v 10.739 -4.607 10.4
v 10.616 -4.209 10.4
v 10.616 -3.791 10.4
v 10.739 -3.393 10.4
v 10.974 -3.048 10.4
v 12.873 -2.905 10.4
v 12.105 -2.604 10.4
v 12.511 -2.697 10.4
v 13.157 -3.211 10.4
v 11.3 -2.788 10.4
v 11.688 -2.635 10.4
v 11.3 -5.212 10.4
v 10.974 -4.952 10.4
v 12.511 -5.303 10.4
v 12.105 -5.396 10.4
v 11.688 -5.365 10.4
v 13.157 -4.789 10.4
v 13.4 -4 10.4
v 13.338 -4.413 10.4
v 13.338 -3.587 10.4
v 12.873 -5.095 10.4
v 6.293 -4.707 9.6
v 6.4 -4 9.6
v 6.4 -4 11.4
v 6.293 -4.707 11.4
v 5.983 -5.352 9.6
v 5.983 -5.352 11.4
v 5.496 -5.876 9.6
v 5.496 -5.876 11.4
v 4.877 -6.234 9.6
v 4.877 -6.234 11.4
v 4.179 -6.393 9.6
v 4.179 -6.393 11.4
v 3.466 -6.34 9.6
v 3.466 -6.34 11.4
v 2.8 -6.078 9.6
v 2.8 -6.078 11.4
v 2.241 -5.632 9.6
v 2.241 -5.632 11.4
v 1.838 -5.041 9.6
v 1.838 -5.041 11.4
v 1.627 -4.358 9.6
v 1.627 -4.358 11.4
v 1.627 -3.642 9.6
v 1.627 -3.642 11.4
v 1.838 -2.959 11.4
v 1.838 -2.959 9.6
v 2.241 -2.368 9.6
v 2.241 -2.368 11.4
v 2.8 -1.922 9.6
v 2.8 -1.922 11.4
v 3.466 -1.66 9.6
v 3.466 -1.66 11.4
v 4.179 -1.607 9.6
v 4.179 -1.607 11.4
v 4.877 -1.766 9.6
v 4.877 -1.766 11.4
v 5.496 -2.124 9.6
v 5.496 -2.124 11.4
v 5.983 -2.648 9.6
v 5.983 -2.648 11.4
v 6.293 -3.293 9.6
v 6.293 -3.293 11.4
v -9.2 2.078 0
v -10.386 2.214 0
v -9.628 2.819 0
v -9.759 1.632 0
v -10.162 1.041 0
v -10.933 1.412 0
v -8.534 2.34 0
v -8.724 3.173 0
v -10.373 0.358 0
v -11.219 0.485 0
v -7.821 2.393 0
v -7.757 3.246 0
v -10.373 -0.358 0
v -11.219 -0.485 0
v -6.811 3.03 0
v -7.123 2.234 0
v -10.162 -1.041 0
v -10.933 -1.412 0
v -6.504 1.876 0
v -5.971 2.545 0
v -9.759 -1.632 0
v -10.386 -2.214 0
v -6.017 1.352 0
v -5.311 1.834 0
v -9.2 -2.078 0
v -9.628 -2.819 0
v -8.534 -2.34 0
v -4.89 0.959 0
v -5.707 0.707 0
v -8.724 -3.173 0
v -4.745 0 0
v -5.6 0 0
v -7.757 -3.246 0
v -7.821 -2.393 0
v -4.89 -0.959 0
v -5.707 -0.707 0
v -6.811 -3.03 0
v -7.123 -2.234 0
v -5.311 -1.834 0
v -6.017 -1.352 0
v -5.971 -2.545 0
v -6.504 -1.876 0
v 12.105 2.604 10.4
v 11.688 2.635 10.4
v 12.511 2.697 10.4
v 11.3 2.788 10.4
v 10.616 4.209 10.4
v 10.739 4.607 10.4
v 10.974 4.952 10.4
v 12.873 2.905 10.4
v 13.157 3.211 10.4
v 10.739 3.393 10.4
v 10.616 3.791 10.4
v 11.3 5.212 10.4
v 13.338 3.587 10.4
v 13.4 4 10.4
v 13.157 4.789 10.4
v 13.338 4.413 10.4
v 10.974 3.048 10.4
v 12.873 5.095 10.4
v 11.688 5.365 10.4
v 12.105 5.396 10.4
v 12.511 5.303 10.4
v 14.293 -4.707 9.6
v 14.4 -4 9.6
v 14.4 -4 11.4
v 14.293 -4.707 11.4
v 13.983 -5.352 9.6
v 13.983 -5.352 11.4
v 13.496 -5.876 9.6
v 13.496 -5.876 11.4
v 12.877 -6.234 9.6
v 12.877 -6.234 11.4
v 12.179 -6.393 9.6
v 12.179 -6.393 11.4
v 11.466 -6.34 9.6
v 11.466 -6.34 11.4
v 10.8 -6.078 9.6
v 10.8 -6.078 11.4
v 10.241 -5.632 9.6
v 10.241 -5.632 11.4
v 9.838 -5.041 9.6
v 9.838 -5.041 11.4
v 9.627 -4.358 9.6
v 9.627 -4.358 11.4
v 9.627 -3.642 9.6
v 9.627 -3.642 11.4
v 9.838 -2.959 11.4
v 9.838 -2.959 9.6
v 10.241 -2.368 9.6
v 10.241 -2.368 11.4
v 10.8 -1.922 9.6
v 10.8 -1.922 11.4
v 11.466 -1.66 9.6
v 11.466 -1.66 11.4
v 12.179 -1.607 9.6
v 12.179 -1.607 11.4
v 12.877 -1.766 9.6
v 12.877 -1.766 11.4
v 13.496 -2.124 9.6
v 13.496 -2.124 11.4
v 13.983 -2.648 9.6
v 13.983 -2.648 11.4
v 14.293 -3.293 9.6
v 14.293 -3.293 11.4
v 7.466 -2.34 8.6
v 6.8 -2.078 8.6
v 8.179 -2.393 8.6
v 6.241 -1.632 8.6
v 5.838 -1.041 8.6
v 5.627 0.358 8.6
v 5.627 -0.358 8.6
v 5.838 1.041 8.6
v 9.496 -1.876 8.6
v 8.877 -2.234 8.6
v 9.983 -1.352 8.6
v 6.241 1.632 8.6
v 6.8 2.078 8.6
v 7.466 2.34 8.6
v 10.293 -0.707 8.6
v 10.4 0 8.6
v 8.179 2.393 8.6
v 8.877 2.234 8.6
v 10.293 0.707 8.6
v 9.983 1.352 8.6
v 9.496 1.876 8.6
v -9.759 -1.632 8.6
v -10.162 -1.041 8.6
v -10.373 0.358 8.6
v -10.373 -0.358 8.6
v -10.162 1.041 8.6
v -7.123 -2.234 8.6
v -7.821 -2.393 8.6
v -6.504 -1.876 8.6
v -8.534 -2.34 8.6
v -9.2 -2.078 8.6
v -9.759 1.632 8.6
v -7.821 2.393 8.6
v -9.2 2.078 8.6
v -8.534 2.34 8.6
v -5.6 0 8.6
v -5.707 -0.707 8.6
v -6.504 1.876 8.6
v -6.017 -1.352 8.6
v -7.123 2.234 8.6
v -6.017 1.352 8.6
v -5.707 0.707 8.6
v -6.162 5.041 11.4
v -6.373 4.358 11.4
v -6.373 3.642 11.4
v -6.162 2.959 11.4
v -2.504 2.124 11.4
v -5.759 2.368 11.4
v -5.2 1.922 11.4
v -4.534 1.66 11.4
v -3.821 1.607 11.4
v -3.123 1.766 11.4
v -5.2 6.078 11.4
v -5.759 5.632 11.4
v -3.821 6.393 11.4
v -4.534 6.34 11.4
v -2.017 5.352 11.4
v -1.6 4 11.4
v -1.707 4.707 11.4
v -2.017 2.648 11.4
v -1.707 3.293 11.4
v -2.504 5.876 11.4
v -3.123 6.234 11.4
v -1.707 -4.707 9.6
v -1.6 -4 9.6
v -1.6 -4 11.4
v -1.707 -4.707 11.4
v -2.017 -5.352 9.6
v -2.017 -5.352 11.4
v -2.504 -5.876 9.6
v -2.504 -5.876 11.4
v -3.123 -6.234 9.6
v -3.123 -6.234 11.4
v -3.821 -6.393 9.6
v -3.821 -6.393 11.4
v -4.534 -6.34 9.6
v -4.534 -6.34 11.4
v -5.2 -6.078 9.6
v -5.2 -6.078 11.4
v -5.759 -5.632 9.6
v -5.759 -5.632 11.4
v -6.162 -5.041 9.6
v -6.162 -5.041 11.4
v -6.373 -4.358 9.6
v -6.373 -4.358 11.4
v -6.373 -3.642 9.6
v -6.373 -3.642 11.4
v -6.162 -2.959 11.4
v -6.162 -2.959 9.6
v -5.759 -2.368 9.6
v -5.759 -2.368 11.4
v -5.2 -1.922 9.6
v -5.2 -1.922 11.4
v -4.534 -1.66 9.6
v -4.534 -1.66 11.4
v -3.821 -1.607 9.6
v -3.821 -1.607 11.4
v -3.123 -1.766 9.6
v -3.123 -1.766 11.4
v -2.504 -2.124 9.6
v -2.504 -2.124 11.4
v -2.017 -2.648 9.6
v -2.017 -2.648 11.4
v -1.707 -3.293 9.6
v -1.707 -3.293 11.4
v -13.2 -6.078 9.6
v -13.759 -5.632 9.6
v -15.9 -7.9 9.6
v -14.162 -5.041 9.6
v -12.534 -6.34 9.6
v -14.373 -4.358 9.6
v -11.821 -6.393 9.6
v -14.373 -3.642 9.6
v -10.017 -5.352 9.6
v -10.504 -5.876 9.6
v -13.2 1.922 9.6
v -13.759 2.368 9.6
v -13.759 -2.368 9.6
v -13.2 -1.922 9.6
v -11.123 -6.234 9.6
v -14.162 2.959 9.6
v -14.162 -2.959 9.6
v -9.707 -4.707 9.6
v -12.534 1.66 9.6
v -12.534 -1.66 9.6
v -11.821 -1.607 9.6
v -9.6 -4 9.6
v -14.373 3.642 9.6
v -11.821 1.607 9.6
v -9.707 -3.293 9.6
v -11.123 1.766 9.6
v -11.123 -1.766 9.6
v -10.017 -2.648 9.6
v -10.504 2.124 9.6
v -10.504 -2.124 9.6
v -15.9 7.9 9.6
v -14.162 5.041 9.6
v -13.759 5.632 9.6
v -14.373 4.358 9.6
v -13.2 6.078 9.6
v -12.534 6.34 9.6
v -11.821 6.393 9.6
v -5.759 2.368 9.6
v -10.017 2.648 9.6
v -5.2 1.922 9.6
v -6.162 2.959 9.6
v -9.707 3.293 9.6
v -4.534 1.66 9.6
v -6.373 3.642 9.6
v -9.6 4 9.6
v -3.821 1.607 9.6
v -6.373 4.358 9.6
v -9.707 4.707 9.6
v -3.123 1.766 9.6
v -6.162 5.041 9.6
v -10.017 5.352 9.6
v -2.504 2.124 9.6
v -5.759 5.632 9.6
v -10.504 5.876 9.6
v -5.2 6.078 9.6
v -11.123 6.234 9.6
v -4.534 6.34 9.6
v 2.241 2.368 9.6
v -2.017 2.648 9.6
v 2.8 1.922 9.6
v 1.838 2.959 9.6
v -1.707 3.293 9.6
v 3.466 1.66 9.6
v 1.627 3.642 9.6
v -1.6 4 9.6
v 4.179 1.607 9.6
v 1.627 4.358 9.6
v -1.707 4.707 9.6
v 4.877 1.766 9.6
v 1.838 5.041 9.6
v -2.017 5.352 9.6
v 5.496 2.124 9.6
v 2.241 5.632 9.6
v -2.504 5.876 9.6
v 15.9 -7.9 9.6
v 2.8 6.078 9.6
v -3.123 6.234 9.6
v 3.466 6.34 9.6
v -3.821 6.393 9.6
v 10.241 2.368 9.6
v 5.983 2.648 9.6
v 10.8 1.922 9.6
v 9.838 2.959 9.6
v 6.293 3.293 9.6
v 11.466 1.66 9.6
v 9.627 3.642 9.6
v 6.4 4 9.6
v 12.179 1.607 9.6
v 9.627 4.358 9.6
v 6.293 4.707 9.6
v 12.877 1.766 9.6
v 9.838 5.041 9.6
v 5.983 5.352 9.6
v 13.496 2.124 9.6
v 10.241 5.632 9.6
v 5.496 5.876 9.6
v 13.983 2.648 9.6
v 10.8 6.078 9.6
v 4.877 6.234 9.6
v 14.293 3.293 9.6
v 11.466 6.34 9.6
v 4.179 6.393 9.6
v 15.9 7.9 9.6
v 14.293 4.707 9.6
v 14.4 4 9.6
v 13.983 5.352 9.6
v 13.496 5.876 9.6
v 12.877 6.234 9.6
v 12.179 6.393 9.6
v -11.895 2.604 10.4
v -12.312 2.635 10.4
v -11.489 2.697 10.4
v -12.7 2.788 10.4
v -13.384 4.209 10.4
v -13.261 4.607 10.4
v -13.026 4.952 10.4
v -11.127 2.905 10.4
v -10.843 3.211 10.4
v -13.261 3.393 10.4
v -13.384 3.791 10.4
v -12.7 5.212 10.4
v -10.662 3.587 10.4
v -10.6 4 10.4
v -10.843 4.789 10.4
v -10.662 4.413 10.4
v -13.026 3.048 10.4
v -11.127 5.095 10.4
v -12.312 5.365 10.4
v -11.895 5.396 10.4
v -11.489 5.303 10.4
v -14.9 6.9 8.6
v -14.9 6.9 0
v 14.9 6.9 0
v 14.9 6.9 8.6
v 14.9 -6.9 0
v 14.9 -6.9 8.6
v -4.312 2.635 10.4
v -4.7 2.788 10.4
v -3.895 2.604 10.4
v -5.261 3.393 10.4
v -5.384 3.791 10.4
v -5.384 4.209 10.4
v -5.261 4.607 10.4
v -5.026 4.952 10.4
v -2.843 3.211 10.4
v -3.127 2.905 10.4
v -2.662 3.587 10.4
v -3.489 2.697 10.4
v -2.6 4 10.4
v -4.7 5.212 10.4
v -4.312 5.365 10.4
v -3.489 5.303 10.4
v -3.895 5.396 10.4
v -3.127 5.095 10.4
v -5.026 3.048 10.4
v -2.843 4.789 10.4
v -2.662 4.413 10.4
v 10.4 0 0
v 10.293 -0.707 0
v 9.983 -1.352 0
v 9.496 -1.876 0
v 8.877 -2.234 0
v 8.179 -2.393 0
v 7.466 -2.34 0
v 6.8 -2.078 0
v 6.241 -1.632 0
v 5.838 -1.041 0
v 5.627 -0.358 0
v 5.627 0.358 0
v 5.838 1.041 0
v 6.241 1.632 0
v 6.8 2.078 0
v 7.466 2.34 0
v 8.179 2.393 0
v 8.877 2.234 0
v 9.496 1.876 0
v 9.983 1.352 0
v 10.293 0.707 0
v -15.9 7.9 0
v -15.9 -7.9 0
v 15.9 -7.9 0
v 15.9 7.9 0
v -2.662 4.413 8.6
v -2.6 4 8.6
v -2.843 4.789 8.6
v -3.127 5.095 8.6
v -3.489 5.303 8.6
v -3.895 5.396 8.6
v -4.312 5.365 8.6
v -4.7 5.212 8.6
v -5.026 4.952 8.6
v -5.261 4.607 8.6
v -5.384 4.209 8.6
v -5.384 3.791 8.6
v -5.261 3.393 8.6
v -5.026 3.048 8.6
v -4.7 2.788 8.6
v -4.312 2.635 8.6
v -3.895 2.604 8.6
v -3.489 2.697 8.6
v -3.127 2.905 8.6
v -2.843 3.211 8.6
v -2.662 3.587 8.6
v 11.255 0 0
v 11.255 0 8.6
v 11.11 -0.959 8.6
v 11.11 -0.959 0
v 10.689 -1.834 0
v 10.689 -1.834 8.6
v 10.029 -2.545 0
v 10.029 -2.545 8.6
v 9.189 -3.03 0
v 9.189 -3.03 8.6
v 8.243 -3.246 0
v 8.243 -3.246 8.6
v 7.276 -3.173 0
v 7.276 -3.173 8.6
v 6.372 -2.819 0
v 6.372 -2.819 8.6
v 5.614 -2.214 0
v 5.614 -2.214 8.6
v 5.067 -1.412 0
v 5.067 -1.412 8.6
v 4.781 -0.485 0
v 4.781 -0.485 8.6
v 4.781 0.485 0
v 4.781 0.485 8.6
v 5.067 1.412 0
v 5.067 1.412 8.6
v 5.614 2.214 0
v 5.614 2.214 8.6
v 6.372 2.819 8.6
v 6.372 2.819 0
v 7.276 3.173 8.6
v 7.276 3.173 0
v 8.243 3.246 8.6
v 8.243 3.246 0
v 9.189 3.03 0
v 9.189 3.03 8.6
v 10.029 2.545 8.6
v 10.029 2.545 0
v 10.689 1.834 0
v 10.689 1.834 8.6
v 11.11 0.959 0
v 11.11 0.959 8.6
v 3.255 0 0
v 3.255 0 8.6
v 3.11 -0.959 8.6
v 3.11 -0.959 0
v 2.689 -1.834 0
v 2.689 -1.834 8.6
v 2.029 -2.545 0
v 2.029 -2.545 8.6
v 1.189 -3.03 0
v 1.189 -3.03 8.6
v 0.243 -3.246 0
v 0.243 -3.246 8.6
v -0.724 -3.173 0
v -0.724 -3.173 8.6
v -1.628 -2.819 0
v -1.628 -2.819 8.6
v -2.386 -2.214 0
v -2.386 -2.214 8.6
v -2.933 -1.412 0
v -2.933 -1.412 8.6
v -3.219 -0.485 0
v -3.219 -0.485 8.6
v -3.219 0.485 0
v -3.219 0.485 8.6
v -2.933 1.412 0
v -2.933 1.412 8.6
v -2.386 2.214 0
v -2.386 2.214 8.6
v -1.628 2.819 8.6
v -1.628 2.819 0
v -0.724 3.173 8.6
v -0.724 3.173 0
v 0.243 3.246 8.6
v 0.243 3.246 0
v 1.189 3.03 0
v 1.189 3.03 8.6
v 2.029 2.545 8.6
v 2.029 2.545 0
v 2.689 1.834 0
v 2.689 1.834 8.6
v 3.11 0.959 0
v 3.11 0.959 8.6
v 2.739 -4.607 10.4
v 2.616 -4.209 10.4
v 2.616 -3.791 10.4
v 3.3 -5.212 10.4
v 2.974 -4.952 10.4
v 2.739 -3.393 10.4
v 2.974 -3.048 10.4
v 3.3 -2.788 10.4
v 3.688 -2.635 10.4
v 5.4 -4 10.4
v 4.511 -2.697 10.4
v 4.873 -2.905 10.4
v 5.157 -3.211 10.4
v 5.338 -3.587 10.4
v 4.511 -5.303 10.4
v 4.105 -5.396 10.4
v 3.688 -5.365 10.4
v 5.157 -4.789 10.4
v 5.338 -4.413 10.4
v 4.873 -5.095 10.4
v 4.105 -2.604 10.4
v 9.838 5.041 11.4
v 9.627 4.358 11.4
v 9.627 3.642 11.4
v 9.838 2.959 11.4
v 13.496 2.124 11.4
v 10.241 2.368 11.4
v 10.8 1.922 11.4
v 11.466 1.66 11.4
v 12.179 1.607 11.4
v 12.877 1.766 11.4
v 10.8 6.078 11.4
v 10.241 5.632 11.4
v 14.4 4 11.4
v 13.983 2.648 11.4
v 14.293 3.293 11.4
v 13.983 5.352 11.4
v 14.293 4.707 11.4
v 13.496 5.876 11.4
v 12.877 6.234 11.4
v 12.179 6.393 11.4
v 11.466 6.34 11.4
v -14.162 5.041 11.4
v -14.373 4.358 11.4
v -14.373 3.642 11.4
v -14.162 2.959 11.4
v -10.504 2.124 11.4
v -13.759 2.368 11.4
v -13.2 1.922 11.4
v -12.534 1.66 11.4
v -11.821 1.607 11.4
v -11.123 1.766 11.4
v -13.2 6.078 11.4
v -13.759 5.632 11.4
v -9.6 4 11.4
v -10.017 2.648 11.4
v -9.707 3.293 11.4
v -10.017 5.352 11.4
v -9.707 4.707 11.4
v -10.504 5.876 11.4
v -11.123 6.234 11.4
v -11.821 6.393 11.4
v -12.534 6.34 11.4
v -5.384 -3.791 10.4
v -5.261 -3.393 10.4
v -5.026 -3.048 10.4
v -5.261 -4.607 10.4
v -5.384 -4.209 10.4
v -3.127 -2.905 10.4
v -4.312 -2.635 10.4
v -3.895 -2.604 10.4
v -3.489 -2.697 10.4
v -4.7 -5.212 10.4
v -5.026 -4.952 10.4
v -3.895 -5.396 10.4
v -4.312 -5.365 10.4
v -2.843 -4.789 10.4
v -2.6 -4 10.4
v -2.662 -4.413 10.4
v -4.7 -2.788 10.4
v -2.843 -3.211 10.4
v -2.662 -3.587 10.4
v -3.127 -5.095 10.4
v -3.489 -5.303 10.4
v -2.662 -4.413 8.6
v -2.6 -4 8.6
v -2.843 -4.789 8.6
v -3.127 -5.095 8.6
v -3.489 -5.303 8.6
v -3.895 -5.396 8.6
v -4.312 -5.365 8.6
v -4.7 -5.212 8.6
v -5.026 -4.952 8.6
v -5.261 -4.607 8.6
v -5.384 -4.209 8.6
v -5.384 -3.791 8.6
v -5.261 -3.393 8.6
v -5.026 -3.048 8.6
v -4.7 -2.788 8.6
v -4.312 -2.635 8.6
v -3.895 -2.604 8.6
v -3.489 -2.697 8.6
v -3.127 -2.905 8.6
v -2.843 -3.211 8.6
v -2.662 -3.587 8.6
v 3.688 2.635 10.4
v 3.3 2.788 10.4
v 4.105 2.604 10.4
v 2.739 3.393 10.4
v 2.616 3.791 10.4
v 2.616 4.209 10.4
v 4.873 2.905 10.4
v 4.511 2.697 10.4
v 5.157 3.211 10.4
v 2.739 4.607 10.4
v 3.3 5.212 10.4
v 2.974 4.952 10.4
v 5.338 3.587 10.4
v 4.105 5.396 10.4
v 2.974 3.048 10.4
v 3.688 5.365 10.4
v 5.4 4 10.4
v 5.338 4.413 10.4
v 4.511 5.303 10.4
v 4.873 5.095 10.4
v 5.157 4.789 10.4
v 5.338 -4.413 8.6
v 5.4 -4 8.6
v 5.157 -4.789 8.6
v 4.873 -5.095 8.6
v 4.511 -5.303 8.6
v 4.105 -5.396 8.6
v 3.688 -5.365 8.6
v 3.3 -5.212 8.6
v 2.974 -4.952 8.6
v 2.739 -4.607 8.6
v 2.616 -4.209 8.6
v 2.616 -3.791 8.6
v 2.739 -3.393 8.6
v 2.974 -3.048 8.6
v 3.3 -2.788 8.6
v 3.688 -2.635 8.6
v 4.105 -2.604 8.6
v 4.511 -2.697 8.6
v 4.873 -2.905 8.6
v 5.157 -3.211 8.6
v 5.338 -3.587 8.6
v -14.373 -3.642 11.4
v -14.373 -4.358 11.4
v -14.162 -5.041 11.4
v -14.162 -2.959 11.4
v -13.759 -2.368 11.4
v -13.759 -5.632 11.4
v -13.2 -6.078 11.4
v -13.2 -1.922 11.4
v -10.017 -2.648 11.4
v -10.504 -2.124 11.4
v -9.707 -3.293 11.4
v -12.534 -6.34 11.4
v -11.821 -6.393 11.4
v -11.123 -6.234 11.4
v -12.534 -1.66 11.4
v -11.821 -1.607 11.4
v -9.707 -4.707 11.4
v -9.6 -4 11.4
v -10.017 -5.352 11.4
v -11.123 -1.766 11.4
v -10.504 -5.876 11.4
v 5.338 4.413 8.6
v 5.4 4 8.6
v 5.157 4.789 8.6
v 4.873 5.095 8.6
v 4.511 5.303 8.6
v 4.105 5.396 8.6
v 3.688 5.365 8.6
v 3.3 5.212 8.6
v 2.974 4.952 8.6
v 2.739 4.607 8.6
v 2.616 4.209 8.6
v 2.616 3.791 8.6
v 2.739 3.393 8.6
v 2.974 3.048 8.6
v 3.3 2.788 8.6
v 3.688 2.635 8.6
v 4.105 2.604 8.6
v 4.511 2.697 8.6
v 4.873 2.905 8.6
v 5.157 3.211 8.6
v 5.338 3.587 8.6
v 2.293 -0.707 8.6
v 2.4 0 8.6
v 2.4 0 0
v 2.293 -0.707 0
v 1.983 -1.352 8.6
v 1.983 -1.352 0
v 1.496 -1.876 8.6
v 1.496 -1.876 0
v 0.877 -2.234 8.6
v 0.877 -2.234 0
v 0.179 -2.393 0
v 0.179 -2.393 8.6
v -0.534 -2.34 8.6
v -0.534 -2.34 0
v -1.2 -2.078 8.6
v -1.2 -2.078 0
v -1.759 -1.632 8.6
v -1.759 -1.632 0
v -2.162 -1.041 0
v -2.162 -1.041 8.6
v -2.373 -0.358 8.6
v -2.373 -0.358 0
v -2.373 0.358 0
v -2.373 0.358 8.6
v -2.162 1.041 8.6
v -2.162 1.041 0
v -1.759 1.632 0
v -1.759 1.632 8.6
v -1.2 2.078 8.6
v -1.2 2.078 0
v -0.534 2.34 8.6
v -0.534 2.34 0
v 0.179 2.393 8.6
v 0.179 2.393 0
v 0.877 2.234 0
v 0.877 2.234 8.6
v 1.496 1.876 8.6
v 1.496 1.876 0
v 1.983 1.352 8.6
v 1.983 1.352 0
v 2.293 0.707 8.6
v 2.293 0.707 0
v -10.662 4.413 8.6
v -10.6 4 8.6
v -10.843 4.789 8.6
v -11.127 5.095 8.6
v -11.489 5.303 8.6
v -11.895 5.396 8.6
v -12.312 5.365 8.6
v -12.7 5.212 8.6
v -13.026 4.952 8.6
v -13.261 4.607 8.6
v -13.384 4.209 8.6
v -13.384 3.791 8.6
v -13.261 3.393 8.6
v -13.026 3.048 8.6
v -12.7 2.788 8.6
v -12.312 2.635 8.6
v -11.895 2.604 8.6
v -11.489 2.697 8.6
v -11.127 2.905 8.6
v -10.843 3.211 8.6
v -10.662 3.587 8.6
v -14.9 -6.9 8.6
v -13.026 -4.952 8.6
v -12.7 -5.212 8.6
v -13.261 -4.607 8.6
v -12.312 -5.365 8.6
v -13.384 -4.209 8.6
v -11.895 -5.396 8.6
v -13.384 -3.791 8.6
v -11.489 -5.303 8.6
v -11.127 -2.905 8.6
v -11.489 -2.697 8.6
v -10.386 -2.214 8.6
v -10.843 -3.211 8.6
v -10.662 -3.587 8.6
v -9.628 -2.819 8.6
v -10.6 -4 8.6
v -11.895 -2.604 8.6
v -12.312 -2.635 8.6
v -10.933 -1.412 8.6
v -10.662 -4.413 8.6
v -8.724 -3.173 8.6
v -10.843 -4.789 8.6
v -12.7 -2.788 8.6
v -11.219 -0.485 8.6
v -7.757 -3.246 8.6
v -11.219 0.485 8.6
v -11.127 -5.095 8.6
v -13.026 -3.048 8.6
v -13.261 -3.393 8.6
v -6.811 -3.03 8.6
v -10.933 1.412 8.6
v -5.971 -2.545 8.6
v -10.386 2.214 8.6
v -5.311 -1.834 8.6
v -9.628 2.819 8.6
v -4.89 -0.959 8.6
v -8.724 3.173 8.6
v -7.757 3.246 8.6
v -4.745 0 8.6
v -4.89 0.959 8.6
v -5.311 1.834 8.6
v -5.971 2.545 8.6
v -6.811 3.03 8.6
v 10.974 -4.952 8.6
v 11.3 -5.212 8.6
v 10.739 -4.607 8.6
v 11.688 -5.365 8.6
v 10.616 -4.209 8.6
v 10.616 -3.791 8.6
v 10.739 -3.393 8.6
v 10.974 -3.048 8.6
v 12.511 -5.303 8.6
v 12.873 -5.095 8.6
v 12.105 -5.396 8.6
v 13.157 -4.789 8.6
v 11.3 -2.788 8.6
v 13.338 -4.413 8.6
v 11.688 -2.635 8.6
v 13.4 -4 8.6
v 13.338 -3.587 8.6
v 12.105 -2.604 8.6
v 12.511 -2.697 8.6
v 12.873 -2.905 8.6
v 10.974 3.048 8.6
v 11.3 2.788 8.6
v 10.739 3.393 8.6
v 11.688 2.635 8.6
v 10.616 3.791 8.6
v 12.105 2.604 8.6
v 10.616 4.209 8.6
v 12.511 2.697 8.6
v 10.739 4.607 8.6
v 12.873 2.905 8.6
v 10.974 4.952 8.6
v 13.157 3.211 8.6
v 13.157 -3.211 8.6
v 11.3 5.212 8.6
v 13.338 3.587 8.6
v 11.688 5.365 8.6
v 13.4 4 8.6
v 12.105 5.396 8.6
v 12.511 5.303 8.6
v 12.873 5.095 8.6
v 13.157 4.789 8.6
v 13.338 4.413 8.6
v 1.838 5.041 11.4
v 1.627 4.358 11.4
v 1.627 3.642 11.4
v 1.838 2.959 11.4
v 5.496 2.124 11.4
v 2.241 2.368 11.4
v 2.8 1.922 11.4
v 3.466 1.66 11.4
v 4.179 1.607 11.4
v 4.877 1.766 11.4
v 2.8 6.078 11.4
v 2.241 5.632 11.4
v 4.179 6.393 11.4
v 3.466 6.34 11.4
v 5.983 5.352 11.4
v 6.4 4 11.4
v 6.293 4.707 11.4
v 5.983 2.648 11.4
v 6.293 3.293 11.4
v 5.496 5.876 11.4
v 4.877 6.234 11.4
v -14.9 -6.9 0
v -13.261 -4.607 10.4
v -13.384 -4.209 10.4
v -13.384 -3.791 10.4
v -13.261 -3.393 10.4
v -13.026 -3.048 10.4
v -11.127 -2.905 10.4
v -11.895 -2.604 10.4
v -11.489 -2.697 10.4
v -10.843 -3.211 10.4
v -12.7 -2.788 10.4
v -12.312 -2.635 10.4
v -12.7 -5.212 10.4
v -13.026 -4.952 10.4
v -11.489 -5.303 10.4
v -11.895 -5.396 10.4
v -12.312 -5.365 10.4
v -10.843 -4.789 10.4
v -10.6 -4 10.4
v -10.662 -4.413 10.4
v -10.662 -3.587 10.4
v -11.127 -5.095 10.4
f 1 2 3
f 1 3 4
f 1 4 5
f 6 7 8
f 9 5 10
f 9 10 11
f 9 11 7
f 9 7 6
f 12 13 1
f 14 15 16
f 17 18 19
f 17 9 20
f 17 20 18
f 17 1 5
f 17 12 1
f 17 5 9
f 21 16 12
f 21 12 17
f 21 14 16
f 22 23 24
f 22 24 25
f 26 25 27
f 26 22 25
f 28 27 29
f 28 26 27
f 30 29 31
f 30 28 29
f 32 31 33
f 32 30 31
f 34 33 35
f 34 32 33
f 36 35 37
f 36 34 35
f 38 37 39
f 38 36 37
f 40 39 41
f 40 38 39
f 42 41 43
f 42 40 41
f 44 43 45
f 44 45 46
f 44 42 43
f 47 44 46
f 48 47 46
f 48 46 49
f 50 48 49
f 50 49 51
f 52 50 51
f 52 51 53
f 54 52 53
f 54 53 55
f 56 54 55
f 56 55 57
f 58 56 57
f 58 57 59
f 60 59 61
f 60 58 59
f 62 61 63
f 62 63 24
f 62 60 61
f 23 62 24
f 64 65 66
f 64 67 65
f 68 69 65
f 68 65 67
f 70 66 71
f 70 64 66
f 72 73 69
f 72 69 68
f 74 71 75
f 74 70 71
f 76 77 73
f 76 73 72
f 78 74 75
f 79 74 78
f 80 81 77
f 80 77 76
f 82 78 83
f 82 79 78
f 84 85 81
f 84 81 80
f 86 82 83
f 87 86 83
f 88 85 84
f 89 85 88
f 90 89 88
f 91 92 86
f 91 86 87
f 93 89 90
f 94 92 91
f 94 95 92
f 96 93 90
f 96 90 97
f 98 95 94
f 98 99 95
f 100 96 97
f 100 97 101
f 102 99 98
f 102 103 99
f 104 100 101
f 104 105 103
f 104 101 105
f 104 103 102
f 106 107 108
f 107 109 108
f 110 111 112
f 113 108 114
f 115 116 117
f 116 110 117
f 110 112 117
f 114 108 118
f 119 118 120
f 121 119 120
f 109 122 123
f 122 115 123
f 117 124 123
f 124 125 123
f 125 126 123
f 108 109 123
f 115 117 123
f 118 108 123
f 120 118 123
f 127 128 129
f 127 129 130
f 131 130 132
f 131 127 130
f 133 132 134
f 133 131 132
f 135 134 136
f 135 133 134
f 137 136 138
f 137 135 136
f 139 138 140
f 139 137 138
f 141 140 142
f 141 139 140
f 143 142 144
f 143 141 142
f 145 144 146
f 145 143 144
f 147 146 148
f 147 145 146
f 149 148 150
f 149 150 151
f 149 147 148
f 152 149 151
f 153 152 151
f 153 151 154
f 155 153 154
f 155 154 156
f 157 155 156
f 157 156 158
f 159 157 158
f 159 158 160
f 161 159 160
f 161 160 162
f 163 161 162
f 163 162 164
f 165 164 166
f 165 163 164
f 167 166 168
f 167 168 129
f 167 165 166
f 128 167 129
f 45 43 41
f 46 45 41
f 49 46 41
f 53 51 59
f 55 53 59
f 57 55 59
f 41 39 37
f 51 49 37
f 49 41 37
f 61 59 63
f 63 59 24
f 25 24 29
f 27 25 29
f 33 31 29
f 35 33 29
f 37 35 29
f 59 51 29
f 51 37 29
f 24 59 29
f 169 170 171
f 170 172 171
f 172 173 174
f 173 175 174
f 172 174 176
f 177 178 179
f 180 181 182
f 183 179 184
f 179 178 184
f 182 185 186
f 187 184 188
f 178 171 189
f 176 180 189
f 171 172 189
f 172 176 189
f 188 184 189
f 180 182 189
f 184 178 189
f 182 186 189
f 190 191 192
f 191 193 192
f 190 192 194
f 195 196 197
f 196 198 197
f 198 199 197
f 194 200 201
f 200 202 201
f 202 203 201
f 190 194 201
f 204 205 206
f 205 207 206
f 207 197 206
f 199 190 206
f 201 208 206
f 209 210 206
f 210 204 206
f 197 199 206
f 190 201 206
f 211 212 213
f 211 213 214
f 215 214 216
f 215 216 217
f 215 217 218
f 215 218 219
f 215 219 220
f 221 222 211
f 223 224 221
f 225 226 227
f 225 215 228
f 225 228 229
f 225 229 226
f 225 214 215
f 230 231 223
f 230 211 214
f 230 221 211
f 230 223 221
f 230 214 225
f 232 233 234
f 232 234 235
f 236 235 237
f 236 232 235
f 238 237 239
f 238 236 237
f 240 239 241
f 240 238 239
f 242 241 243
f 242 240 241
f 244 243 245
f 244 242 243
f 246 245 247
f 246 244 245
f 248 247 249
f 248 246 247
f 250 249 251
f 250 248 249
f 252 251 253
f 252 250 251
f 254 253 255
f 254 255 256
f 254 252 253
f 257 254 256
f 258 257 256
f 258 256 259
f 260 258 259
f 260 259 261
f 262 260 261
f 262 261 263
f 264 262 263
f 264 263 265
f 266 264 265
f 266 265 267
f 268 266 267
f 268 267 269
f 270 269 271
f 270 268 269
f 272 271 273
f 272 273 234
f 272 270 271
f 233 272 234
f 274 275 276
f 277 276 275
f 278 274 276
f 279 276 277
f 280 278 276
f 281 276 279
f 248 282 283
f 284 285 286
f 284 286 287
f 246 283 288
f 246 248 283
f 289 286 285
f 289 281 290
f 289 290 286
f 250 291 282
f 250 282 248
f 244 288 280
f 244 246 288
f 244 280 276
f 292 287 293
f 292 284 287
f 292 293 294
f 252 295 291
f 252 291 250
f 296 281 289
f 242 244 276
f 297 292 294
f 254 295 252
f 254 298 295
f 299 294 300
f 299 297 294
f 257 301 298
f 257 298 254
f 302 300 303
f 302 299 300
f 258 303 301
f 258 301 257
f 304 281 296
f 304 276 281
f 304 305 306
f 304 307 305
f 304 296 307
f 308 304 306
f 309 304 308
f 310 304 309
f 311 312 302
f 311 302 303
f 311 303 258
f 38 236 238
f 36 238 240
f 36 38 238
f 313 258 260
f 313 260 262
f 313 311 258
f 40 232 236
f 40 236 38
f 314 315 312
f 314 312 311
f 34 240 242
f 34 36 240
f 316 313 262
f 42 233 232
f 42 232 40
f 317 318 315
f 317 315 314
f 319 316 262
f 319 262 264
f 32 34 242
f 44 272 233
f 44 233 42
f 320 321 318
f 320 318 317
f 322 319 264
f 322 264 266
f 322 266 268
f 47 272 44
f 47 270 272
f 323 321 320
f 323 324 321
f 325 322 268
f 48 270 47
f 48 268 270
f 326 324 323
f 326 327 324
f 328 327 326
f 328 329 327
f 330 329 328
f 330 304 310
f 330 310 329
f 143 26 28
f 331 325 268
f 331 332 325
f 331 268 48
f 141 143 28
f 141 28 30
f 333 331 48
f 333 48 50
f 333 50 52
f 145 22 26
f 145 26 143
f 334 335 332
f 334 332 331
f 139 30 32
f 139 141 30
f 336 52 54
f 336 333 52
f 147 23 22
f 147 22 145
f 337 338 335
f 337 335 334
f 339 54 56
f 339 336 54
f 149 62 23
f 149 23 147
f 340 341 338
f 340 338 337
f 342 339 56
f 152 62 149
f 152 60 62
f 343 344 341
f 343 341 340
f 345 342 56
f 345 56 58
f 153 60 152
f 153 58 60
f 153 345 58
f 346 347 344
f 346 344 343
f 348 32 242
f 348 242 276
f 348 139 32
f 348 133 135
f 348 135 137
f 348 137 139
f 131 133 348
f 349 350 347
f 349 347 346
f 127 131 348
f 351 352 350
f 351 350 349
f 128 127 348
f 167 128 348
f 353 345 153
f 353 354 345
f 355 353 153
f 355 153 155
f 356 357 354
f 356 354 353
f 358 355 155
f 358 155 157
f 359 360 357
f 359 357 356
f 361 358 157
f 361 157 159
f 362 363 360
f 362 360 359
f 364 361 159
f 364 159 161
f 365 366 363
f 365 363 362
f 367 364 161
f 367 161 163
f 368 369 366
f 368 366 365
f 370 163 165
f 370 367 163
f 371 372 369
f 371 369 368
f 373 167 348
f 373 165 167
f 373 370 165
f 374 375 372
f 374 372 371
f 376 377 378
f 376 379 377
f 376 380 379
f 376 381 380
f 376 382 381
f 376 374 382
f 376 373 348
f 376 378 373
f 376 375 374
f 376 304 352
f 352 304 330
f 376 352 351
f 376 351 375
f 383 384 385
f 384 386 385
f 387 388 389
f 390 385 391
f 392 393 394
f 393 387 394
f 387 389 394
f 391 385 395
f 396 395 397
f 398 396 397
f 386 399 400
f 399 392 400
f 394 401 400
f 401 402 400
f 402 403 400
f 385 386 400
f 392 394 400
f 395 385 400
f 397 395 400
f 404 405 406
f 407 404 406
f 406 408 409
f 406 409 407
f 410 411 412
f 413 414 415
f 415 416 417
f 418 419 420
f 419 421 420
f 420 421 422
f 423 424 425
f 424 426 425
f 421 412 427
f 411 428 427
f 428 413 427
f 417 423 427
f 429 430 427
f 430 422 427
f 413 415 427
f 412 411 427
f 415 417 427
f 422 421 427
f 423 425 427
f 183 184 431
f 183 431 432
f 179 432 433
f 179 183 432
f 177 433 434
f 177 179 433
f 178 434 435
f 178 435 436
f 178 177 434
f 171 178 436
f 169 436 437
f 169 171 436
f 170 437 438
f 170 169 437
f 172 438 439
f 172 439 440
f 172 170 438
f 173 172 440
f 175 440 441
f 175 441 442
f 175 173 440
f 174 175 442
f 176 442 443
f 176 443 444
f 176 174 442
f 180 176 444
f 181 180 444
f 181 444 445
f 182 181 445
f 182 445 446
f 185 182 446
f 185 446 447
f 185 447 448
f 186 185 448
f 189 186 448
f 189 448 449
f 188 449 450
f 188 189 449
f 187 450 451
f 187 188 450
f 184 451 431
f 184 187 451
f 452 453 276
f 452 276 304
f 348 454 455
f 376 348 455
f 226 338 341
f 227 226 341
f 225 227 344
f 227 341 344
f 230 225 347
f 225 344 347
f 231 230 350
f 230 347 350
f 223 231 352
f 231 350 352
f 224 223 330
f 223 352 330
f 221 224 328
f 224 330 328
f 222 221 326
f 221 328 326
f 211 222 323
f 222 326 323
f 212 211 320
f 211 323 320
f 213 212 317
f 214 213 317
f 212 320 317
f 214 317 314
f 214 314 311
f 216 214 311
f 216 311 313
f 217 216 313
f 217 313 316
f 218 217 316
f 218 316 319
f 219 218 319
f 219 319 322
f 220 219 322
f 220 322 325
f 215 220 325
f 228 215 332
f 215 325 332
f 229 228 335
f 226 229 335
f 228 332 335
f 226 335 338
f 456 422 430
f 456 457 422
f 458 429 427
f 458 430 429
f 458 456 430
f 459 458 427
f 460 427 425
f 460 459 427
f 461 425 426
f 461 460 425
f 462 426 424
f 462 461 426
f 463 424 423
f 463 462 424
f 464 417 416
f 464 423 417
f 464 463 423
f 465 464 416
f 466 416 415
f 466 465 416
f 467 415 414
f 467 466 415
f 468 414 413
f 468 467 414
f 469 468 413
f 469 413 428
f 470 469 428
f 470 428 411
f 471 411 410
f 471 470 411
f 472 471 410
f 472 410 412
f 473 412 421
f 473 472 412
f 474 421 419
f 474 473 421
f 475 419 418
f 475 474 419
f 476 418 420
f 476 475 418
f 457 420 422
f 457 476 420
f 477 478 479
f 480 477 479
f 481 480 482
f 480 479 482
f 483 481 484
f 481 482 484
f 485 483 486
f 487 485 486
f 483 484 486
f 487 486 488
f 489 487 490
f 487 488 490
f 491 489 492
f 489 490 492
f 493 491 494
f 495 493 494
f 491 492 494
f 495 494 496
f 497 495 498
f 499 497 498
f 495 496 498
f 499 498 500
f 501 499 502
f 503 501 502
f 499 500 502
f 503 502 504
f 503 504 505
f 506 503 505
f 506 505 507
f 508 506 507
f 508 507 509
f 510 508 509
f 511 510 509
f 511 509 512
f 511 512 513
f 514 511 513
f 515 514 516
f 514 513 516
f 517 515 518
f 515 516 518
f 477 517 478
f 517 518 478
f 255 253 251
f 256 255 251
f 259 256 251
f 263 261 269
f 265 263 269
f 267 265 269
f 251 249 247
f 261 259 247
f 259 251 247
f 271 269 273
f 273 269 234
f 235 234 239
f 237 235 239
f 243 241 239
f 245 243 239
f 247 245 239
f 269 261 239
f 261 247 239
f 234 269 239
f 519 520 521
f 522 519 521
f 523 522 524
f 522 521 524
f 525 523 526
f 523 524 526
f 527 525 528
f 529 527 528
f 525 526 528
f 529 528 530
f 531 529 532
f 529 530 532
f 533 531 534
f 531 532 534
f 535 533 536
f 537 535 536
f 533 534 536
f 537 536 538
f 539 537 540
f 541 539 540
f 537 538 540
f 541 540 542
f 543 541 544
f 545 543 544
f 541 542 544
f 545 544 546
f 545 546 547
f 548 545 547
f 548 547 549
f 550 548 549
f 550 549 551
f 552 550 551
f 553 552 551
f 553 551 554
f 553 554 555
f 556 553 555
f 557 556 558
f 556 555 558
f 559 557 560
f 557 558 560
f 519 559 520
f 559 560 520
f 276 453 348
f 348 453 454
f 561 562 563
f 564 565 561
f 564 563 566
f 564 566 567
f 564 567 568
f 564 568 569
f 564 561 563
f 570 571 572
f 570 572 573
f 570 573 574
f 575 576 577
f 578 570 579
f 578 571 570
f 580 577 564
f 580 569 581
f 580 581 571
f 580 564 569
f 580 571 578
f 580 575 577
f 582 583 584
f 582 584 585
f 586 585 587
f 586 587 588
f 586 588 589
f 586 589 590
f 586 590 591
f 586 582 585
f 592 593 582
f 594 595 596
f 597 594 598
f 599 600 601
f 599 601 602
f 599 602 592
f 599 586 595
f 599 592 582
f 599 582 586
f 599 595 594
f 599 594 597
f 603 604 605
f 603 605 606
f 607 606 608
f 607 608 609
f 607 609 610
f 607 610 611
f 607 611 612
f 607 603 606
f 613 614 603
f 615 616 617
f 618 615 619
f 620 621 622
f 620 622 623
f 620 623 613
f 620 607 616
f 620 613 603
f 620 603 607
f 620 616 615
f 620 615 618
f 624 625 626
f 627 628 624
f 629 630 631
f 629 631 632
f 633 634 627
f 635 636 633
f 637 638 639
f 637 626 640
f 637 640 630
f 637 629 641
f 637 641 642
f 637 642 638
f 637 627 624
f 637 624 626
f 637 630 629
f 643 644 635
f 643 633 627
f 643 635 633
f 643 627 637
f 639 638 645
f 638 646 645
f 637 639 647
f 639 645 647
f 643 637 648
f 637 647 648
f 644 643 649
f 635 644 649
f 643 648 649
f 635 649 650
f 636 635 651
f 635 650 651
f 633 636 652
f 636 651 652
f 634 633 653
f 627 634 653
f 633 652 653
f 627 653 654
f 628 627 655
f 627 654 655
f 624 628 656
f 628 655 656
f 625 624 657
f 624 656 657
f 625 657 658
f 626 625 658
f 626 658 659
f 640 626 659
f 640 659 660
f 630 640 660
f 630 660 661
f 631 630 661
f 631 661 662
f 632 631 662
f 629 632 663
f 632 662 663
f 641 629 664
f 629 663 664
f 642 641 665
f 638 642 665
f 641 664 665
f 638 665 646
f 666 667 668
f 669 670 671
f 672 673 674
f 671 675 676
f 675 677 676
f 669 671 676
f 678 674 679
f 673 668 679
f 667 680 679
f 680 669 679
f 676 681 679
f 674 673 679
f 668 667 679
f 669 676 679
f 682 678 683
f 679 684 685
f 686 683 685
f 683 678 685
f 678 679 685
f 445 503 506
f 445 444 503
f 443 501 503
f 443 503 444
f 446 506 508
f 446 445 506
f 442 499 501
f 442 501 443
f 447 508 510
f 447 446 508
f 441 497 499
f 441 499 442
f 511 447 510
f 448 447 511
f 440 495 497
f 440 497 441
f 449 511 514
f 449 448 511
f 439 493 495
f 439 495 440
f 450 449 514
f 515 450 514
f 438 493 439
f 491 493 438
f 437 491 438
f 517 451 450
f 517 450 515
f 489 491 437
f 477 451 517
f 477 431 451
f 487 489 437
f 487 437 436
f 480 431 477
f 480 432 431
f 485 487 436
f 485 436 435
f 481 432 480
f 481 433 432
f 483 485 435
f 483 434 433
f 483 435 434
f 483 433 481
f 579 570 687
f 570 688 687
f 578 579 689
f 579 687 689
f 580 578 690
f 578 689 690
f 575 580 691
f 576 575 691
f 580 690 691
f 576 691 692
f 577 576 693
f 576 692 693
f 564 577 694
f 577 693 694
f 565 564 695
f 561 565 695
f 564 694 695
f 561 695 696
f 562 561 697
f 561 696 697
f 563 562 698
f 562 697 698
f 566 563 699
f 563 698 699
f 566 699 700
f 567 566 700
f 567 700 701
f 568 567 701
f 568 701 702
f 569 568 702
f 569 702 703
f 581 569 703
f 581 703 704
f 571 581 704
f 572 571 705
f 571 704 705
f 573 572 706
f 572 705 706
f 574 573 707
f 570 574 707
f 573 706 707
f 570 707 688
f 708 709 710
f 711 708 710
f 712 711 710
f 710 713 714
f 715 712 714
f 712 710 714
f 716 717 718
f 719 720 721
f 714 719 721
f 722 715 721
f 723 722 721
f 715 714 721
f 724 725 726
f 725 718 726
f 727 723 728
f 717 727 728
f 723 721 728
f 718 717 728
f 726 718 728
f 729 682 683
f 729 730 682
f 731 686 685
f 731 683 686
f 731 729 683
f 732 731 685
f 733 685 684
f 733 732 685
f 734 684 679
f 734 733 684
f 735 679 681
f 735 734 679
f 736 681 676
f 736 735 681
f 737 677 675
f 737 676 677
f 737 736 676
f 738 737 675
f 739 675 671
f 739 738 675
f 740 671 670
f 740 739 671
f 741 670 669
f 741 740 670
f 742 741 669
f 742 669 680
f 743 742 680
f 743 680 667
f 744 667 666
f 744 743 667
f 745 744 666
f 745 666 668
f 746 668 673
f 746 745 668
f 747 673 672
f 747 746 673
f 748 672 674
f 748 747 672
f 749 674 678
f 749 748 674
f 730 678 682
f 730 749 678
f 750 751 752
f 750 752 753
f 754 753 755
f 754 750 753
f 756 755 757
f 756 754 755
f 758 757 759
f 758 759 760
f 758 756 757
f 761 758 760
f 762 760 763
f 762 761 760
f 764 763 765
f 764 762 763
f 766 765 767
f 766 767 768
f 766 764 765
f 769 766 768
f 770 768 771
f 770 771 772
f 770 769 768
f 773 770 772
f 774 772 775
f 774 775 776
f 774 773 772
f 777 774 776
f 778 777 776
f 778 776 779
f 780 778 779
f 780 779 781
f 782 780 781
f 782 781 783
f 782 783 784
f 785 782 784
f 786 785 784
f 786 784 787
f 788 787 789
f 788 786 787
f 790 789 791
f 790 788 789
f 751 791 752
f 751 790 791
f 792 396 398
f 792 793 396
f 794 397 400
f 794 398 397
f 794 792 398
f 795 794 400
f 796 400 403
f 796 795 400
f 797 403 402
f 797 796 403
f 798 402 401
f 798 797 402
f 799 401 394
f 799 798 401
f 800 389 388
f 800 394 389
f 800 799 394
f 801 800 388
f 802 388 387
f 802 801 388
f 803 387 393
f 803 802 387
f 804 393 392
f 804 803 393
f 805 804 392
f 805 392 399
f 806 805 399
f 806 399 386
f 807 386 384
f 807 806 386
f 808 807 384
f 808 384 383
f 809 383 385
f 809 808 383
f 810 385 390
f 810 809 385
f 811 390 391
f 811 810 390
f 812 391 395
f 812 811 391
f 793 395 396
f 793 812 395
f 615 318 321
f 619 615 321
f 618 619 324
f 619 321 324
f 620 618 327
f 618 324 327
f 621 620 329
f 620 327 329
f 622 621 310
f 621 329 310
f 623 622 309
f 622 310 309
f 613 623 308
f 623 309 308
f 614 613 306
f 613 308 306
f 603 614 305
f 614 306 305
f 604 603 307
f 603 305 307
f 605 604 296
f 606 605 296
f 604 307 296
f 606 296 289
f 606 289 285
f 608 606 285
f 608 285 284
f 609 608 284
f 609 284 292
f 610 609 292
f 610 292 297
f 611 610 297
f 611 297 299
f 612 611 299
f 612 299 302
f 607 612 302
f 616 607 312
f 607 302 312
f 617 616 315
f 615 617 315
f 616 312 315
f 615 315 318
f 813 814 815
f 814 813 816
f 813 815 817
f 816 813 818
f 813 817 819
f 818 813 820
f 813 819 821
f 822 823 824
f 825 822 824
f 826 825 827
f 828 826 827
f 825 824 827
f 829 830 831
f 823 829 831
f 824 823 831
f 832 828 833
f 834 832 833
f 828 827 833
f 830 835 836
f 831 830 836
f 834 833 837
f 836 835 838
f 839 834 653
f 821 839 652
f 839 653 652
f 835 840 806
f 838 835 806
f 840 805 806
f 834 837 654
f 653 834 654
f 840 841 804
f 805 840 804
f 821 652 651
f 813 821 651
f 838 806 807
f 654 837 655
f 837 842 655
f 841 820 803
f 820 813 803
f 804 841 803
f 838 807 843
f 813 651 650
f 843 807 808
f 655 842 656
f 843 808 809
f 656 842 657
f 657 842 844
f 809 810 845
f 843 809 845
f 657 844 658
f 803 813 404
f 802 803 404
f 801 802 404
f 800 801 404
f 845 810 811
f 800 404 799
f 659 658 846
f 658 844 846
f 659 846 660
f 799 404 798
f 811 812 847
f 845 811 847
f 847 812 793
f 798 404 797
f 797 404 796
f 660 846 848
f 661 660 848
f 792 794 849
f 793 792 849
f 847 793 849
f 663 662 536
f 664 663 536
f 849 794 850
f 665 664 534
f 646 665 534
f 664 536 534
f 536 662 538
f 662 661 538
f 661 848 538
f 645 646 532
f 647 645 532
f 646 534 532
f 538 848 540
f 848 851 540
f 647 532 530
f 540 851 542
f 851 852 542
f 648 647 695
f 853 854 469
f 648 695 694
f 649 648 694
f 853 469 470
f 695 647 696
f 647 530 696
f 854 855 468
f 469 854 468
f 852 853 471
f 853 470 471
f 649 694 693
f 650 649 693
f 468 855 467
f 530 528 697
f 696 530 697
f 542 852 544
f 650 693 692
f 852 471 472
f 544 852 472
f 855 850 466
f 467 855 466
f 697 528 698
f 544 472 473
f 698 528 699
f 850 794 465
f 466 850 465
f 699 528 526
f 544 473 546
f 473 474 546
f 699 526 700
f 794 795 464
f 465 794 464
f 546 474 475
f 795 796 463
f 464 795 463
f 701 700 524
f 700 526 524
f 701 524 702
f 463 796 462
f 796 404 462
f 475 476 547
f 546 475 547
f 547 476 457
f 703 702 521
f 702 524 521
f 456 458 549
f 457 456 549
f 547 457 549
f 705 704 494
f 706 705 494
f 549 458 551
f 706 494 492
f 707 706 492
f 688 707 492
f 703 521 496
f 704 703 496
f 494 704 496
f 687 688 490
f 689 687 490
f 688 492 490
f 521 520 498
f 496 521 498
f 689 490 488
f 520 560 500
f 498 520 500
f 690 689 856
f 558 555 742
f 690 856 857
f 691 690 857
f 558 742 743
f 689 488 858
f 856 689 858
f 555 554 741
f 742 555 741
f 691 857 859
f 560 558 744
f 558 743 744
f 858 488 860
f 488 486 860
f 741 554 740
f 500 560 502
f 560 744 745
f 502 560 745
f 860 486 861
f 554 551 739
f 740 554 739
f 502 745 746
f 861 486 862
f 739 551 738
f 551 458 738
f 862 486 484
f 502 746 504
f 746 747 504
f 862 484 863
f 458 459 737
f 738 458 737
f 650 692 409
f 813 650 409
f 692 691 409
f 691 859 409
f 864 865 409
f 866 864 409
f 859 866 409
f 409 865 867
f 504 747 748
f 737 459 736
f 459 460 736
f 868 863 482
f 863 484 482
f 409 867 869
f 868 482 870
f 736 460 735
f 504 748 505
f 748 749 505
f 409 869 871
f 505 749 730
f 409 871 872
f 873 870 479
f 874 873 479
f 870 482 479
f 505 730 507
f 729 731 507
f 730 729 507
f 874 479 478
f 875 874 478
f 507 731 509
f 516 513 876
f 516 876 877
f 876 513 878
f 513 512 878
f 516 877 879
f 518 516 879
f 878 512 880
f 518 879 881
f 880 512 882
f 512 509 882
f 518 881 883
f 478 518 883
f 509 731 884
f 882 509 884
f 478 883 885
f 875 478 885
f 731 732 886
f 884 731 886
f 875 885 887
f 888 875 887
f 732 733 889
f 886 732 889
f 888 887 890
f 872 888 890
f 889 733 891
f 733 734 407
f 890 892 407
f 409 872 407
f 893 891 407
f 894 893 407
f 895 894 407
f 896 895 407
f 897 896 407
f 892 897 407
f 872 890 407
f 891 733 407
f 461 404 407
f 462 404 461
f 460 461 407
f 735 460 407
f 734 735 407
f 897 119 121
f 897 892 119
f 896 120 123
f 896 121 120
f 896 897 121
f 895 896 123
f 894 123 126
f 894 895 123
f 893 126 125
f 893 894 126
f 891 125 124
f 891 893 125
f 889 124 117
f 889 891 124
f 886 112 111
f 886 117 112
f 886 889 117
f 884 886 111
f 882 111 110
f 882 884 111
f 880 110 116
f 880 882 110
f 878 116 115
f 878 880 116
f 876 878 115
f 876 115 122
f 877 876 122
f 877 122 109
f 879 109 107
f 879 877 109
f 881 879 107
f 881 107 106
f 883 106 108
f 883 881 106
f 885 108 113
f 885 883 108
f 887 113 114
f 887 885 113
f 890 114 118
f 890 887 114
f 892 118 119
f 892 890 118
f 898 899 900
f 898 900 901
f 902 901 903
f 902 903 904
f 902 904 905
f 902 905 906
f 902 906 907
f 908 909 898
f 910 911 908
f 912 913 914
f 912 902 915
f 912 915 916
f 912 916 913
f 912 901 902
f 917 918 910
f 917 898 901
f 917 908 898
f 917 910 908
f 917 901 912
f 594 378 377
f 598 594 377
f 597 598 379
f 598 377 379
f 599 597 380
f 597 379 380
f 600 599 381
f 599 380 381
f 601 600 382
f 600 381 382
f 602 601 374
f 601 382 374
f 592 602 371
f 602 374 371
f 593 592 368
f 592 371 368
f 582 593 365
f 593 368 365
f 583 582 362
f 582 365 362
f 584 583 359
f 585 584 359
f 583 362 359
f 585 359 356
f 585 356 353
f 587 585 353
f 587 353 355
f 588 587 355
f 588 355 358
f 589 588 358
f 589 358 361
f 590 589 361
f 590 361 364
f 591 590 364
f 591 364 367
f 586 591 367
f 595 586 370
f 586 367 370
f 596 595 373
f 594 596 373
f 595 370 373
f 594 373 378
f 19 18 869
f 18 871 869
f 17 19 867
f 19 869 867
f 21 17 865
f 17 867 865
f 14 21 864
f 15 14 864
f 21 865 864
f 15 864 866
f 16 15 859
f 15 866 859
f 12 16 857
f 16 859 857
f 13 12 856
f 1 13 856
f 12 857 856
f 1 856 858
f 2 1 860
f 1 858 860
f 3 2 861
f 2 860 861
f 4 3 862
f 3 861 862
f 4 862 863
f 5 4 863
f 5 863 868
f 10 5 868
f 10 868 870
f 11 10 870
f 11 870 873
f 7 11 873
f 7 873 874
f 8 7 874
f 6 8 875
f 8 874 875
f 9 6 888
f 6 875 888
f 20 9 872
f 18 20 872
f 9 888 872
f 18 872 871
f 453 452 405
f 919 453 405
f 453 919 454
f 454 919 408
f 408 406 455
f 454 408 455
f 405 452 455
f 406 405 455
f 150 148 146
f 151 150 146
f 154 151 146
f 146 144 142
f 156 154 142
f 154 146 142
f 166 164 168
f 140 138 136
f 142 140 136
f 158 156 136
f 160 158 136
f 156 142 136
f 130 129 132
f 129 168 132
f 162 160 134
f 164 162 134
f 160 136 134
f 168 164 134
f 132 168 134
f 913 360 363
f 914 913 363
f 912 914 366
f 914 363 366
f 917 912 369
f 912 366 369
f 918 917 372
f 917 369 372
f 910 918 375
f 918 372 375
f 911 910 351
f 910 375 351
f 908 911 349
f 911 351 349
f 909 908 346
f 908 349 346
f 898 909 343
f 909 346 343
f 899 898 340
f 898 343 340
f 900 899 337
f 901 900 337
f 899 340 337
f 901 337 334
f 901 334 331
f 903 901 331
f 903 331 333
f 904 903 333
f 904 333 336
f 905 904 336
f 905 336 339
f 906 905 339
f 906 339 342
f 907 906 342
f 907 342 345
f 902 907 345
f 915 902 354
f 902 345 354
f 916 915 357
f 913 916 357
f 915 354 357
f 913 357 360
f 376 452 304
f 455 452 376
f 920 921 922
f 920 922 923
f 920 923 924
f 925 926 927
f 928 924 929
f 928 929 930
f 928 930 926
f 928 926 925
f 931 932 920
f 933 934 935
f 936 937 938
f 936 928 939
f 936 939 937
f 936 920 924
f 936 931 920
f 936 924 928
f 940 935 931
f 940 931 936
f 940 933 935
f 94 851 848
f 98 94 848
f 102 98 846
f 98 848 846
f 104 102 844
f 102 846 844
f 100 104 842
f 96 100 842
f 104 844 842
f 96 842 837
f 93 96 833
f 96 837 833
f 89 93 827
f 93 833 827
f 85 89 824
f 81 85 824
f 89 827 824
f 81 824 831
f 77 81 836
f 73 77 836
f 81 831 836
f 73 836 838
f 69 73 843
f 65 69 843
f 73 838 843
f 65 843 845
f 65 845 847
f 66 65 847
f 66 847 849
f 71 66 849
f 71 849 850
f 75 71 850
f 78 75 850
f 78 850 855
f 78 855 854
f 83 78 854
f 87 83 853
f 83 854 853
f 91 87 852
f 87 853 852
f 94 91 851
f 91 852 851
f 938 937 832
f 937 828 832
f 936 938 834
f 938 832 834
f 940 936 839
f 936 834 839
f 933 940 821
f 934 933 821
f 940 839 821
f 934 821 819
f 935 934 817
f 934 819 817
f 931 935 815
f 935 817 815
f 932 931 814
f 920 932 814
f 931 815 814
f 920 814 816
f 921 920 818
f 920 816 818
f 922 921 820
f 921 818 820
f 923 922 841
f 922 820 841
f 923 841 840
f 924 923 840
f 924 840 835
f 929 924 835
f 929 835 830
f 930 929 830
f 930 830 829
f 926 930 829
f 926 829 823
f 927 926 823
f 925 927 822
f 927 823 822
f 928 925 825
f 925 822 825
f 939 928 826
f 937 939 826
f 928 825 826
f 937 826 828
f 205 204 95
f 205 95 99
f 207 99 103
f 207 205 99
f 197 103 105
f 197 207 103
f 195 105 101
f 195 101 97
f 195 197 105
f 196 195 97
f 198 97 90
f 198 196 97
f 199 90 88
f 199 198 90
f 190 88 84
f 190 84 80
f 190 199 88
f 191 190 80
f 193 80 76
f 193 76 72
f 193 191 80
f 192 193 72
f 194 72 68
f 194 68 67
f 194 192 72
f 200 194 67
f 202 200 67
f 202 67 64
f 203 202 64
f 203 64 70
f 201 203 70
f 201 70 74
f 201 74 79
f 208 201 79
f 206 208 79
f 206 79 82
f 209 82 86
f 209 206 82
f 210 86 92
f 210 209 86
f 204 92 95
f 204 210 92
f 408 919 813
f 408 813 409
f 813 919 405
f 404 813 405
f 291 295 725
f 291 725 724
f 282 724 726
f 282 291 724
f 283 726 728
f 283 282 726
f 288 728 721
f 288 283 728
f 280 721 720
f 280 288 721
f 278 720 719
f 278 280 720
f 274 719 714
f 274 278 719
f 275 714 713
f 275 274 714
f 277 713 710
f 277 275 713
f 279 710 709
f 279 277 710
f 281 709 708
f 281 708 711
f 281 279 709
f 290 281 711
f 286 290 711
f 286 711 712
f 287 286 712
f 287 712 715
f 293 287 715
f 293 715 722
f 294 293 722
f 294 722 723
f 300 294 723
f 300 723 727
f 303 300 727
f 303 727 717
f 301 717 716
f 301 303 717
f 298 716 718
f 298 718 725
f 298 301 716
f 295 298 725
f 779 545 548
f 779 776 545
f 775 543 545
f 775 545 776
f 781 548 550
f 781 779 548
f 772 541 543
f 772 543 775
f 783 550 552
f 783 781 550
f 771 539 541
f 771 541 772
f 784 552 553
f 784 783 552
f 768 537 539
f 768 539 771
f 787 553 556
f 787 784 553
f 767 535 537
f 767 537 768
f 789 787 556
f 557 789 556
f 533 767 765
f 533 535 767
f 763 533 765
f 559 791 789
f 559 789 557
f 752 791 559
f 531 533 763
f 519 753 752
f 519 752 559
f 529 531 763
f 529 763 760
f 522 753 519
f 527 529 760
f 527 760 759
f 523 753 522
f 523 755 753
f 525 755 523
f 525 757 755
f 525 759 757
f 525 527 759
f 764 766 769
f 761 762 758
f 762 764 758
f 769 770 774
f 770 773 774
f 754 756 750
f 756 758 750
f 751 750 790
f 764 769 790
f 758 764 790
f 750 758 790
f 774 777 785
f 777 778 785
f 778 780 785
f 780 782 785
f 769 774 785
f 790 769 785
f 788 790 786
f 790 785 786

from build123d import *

# Parameters (mm, degrees)
F0_W     = 31.8
F0_H     = 15.8
F1_DEPTH = 9.6
F2_R     = 2.4
F3_DEPTH = 1.8
F4_T     = -1
F5_R     = 3.255
F5_R_2   = 2.4
F6_DEPTH = 8.6


# Not quite as in the source:
# - a pattern or mirror of a feature is missing from the dataset's text; its kind, count and spacing are read off the source's solid


with BuildPart() as f1:
    # F0 (on Top) → F1 (new body)
    with BuildSketch(Plane.XY):
        Rectangle(F0_W, F0_H)
    extrude(amount=F1_DEPTH)

    # F2 (on face) → F3 (join)
    with BuildSketch(Plane.XY.offset(9.6)):
        with Locations((-12, 4)):
            Circle(F2_R)
        with Locations((-4, 4)):
            Circle(F2_R)
        with Locations((4, 4)):
            Circle(F2_R)
        with Locations((12, 4)):
            Circle(F2_R)
    f3 = extrude(amount=F3_DEPTH)

    # F3_copies: F3 across plane
    add(f3.mirror(Plane(origin=(0, 0, 0), x_dir=(0, 0, -1), z_dir=(0, -1, 0))))

    # F4
    f4_openings = [f1.faces().sort_by_distance(p)[0] for p in [
        (0, 0, 0),
    ]]
    offset(amount=F4_T, openings=f4_openings, kind=Kind.INTERSECTION)

    # F5 (on face) → F6 (join, through all)
    with BuildSketch(Plane(origin=(0, 0, 8.6), x_dir=(1, 0, 0), z_dir=(0, 0, -1))):
        with Locations((-8, 0)):
            Circle(F5_R)
        with Locations((-8, 0)):
            Circle(F5_R_2, mode=Mode.SUBTRACT)
        Circle(F5_R)
        Circle(F5_R_2, mode=Mode.SUBTRACT)
        with Locations((8, 0)):
            Circle(F5_R)
        with Locations((8, 0)):
            Circle(F5_R_2, mode=Mode.SUBTRACT)
    extrude(amount=F6_DEPTH)


solid = f1.part
